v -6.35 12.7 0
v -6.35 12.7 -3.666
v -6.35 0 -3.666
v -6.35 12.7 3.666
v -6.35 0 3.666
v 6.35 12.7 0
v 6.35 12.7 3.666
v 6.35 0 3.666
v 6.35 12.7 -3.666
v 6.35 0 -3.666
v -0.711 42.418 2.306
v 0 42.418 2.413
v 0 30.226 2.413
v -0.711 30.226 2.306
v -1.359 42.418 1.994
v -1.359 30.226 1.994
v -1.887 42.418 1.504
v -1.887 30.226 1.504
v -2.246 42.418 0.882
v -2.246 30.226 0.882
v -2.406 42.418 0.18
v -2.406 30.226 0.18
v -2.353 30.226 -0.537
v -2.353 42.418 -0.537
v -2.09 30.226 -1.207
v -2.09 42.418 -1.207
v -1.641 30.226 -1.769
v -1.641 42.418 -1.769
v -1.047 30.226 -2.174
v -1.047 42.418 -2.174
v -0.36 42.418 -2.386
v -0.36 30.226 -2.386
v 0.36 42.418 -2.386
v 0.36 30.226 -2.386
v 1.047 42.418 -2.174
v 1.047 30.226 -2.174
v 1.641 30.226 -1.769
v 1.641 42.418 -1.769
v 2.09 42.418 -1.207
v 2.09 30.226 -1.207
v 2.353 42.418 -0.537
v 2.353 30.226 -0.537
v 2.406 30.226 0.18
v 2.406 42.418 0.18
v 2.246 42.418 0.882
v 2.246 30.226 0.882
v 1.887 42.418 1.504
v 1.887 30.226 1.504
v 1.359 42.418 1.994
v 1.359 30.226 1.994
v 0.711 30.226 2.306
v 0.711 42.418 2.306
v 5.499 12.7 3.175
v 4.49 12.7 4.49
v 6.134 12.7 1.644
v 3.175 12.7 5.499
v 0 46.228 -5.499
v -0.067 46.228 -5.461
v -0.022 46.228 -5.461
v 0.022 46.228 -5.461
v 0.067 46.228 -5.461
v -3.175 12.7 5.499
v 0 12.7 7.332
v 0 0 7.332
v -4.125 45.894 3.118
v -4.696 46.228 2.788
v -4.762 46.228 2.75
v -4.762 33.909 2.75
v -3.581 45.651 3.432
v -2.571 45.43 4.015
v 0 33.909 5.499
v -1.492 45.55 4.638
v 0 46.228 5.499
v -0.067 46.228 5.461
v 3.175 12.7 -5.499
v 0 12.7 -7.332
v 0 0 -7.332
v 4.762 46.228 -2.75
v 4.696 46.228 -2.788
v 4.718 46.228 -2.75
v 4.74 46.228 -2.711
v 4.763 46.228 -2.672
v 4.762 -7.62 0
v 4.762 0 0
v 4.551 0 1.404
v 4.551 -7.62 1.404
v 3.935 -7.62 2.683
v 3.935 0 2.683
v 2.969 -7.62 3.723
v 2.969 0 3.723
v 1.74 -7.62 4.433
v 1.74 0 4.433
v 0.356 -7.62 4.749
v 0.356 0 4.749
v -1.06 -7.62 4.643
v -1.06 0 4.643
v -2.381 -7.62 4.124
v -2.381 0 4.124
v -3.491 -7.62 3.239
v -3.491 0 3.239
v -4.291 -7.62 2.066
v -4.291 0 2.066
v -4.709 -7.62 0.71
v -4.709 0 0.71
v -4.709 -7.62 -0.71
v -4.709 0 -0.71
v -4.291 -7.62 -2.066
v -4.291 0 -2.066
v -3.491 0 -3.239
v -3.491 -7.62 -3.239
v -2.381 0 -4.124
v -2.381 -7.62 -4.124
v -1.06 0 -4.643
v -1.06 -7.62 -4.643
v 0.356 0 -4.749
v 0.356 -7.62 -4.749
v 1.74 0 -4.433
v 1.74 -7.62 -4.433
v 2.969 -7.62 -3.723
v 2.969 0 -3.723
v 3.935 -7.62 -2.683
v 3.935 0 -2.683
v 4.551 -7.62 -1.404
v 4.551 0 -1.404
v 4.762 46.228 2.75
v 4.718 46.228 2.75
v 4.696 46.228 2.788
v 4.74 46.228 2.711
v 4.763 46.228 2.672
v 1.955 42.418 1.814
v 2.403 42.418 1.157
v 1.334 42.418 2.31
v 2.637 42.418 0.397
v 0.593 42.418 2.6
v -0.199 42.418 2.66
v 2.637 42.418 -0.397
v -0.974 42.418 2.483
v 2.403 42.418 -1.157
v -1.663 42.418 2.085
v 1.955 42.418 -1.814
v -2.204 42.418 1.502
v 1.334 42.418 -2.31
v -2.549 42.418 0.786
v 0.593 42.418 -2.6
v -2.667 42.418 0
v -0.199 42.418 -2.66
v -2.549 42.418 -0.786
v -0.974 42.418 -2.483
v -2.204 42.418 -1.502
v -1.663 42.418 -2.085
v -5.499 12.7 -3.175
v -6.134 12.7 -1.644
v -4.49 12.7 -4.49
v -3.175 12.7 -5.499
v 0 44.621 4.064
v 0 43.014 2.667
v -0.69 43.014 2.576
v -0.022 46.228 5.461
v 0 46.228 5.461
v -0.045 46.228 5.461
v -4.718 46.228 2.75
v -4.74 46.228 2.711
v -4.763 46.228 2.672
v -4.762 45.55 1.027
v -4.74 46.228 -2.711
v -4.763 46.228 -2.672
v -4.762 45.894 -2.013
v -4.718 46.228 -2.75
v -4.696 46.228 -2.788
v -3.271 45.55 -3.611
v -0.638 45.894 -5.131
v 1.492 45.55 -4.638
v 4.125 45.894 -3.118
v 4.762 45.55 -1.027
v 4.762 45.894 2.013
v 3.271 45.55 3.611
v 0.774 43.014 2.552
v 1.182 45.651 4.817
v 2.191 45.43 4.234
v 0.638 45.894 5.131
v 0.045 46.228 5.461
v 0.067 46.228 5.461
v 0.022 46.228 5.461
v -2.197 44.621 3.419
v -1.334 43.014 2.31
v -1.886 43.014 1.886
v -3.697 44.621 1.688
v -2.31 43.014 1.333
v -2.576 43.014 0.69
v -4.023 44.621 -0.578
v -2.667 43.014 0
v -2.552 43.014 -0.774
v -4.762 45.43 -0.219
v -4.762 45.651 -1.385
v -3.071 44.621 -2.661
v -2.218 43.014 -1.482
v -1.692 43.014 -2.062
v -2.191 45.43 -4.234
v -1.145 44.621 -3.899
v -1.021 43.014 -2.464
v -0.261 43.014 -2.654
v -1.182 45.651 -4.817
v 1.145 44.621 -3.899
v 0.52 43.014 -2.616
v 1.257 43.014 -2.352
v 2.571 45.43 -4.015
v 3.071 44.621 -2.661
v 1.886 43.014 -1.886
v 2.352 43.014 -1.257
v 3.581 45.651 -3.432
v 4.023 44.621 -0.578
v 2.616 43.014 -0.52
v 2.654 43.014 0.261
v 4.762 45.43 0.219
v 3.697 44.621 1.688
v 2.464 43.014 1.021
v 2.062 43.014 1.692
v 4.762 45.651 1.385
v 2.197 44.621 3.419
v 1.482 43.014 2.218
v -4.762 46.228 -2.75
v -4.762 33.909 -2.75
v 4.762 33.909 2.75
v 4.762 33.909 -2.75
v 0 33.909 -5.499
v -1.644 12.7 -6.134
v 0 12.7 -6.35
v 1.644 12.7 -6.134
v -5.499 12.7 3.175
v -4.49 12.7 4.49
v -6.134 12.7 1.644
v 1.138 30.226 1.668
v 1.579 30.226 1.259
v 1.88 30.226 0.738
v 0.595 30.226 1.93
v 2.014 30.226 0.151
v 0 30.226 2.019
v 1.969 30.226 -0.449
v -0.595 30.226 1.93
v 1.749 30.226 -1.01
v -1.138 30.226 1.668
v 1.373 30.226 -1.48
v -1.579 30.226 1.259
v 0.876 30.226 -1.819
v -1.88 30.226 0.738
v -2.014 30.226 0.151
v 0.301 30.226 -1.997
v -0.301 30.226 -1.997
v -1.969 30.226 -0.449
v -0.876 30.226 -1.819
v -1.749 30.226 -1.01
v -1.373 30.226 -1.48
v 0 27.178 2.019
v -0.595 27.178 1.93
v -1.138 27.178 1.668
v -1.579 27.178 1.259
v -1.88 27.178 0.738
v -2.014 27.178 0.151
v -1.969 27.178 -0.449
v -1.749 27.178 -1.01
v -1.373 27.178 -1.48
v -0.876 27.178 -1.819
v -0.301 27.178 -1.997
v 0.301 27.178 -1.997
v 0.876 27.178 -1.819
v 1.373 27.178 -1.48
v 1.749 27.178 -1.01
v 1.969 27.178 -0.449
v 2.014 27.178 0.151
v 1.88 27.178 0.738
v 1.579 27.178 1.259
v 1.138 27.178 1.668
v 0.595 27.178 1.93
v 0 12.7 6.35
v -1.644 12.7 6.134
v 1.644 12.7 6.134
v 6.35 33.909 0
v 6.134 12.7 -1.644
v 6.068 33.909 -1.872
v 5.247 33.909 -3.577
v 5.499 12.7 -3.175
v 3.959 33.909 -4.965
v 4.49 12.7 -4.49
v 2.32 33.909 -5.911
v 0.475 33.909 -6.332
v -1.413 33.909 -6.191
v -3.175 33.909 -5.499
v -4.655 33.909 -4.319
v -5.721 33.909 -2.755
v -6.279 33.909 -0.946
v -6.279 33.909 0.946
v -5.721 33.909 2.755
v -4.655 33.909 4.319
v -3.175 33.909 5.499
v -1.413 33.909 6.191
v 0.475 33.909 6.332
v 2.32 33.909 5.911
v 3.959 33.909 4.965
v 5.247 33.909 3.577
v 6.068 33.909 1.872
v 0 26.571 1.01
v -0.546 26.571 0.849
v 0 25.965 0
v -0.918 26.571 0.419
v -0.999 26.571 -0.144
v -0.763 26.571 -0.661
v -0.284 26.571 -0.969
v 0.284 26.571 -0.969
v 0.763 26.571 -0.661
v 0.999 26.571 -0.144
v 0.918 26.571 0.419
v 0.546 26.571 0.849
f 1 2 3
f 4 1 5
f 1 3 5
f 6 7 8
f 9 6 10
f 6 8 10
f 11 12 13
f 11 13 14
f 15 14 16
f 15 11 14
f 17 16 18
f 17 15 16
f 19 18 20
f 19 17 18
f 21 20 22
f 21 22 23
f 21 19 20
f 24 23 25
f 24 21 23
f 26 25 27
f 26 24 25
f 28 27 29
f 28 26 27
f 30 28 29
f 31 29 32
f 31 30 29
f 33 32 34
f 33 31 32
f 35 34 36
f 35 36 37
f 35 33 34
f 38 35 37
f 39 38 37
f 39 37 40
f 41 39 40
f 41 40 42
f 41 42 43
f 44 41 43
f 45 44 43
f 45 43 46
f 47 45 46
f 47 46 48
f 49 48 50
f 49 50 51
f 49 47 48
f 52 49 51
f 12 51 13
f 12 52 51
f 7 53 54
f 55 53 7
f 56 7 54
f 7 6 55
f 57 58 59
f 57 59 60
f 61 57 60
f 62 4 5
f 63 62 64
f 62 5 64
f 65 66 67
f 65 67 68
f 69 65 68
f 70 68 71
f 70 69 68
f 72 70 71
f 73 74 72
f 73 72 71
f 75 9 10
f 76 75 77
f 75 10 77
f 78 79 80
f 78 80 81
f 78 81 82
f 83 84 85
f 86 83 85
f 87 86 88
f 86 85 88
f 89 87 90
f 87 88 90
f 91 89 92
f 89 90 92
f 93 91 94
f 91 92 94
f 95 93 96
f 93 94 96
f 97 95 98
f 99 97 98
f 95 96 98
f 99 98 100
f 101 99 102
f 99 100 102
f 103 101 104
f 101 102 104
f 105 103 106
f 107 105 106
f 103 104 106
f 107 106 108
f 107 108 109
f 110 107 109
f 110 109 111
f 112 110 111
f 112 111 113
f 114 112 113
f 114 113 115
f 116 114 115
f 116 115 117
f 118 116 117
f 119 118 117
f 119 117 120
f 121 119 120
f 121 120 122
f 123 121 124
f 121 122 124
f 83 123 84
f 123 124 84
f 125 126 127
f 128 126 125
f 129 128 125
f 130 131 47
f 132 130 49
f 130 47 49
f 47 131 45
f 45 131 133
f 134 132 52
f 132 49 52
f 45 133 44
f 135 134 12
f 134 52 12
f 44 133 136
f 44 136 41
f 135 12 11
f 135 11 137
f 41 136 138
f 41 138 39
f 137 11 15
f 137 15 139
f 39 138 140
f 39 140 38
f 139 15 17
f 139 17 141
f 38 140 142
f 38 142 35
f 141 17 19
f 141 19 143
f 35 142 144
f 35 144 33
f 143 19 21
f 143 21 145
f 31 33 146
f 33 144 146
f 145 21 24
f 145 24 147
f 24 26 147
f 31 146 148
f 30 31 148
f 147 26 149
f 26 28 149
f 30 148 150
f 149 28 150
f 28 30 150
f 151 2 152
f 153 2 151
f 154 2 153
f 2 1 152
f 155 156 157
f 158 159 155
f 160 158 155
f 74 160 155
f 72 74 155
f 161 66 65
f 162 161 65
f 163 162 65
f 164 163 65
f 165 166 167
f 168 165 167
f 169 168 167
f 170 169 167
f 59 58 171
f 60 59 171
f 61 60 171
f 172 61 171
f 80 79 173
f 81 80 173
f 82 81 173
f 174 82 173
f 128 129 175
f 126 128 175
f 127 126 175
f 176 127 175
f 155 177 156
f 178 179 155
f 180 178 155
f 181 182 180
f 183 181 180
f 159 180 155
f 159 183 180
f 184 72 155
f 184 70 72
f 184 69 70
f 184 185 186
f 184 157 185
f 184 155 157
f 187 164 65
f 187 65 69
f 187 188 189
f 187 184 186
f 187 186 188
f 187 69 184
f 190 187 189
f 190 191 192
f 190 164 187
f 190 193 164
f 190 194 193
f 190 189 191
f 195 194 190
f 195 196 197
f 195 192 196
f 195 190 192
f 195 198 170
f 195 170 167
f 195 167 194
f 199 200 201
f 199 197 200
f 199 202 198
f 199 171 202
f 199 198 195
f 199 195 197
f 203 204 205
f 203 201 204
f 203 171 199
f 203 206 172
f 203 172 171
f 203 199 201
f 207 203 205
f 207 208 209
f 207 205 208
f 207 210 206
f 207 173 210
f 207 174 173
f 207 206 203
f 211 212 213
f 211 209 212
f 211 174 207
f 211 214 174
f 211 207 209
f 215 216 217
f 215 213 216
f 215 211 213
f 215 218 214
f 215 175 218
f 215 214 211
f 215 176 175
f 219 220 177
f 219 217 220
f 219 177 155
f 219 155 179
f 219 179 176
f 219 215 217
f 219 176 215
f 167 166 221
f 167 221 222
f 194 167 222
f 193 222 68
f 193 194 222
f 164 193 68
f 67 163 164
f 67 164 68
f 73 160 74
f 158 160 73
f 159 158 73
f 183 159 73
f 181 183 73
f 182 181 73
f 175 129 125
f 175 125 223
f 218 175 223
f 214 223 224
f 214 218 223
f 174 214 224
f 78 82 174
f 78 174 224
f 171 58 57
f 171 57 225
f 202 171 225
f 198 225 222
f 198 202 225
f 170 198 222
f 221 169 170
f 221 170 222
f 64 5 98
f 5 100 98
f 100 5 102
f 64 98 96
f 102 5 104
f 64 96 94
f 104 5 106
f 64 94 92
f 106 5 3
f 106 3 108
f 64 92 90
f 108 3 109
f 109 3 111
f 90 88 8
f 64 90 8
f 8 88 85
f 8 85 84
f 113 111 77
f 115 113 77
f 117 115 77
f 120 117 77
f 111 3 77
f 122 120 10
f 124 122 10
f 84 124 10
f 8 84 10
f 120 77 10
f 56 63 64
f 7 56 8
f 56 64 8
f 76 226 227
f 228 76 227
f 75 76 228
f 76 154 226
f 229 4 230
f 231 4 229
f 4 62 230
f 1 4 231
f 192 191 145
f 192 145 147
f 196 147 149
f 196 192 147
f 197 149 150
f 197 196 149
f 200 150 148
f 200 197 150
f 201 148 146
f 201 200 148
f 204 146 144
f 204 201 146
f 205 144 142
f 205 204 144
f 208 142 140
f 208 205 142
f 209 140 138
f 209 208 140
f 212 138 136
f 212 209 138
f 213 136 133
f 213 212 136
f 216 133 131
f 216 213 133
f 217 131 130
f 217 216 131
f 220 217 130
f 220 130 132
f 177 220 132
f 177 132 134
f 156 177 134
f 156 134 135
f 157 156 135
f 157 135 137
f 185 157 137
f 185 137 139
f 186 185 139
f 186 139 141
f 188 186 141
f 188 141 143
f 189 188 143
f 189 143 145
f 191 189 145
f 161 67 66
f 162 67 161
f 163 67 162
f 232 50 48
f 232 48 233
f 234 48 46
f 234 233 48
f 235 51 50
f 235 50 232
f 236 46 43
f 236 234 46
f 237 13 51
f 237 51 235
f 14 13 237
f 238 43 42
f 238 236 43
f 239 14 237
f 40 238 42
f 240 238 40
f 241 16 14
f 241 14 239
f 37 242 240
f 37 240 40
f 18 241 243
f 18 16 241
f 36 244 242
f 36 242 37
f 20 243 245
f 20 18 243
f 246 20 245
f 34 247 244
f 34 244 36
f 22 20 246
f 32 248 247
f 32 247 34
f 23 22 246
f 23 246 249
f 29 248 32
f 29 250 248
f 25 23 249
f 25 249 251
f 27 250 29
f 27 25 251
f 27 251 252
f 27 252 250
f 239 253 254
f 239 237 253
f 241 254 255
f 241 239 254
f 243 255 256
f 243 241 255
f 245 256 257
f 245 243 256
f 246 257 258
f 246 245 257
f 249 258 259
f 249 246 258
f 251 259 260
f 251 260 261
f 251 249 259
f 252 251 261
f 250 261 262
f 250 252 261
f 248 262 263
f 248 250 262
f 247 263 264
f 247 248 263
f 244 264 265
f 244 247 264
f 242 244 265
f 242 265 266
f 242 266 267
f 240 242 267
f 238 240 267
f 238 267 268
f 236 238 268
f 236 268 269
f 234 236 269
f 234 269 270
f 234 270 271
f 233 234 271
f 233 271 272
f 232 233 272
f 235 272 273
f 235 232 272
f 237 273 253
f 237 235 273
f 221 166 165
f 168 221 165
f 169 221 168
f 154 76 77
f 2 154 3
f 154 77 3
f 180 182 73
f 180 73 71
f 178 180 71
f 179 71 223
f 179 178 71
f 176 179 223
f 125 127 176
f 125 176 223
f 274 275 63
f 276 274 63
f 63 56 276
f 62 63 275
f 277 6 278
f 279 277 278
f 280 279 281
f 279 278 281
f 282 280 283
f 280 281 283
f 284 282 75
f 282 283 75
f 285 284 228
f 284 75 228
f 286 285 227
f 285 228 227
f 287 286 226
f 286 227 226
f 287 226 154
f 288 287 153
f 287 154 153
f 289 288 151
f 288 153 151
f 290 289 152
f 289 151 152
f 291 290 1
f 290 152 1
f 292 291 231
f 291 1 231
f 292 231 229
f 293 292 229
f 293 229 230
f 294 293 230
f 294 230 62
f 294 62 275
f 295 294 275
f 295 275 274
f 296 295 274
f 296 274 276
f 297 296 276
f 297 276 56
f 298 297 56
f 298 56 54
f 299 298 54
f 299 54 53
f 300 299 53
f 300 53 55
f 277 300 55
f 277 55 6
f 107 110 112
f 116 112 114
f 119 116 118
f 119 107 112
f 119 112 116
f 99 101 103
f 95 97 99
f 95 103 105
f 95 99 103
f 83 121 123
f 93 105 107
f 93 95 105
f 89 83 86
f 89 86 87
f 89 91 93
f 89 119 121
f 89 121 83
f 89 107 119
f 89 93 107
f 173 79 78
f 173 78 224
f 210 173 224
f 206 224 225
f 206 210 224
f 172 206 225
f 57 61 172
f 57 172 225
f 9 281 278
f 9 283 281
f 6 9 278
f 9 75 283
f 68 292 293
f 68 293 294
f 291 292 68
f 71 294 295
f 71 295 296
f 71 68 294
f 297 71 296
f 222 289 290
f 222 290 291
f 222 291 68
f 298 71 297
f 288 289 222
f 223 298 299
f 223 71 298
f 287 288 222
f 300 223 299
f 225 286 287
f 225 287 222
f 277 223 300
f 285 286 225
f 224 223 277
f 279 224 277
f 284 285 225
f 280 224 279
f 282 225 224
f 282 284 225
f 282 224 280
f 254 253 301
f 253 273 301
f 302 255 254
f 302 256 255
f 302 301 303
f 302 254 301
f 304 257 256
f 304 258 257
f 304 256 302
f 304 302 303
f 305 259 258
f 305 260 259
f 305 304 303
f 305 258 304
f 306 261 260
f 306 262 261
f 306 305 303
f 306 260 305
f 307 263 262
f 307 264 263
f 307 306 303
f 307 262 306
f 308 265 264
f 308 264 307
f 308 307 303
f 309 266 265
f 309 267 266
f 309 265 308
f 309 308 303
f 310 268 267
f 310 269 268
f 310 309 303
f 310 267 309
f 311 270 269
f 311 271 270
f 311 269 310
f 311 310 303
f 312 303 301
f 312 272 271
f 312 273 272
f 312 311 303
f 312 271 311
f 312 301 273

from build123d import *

# Parameters (mm, degrees)
BOSS_EXTRUDE1_DEPTH = 12.7
SKETCH2_R           = 4.7625
BOSS_EXTRUDE2_DEPTH = 7.62
SKETCH3_R           = 6.35
BOSS_EXTRUDE3_DEPTH = 33.528
CUT_EXTRUDE3_START  = -12.319
SKETCH8_R           = 6.35
CUT_EXTRUDE3_DEPTH  = 12.319
SKETCH9_R           = 2.667
CUT_EXTRUDE4_DEPTH  = 3.81


with BuildPart() as part:
    # Sketch1 → Boss-Extrude1 (new body)
    with BuildSketch(Plane(origin=(0, 0, 0), x_dir=(1, 0, 0), z_dir=(0, 1, 0))):
        Polygon((6.35, -3.666174209), (6.35, 3.666174209), (0, 7.332348419), (-6.35, 3.666174209), (-6.35, -3.666174209), (0, -7.332348419), align=None)
    extrude(amount=BOSS_EXTRUDE1_DEPTH)

    # Sketch2 → Boss-Extrude2 (add)
    with BuildSketch(Plane.XZ):
        Circle(SKETCH2_R)
    extrude(amount=BOSS_EXTRUDE2_DEPTH)

    # Sketch3 → Boss-Extrude3 (add)
    with BuildSketch(Plane(origin=(0, 12.7, 0), x_dir=(1, 0, 0), z_dir=(0, 1, 0))):
        Circle(SKETCH3_R)
    extrude(amount=BOSS_EXTRUDE3_DEPTH)

    # Sketch6 → Tapped Hole1 (revolve, cut)
    with BuildSketch(Plane(origin=(0, 46.228, 0), x_dir=(0, 0, 1), z_dir=(1, 0, 0))):
        Polygon((0, 0), (0, 20.263317848), (2.0193, 19.05), (2.0193, 16.002), (2.413, 16.002), (2.413, 3.506322905), (5.461, 0), align=None)
    revolve(axis=Axis((0, 52.578, 0), (0, -1, 0)), mode=Mode.SUBTRACT)

    # Sketch8 → Cut-Extrude3 (cut)
    with BuildSketch(Plane(origin=(0, 46.228, 0), x_dir=(1, 0, 0), z_dir=(0, 1, 0)).offset(CUT_EXTRUDE3_START)):
        Circle(SKETCH8_R)
        Polygon((-4.7625, -2.749630657), (0, -5.499261314), (4.7625, -2.749630657), (4.7625, 2.749630657), (0, 5.499261314), (-4.7625, 2.749630657), align=None, mode=Mode.SUBTRACT)
    extrude(amount=CUT_EXTRUDE3_DEPTH, mode=Mode.SUBTRACT)

    # Sketch9 → Cut-Extrude4 (cut)
    with BuildSketch(Plane(origin=(0, 46.228, 0), x_dir=(-1, 0, 0), z_dir=(0, -1, 0))):
        Circle(SKETCH9_R)
    extrude(amount=CUT_EXTRUDE4_DEPTH, mode=Mode.SUBTRACT)


solid = part.part
